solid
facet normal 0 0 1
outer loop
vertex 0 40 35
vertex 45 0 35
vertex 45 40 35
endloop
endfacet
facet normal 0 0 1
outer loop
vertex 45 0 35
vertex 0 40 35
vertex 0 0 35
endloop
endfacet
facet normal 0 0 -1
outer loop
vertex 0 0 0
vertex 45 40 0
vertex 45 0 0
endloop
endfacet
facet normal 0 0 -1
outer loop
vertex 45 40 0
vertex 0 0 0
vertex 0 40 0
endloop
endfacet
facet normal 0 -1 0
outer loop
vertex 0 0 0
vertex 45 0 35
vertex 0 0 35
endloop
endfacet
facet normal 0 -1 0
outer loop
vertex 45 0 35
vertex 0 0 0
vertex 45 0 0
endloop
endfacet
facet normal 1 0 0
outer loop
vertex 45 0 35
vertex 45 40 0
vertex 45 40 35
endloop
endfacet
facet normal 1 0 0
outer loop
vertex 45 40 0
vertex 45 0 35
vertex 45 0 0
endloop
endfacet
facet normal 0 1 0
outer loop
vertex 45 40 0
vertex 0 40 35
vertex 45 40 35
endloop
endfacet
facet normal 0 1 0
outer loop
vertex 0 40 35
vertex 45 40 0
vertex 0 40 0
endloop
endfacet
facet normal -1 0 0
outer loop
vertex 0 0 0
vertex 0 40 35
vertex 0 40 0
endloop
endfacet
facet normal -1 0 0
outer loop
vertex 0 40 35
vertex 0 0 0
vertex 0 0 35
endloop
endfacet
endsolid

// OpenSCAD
side1 = 45;
side2 = 40;
side3 = 35;

cube([side1, side2, side3]);
